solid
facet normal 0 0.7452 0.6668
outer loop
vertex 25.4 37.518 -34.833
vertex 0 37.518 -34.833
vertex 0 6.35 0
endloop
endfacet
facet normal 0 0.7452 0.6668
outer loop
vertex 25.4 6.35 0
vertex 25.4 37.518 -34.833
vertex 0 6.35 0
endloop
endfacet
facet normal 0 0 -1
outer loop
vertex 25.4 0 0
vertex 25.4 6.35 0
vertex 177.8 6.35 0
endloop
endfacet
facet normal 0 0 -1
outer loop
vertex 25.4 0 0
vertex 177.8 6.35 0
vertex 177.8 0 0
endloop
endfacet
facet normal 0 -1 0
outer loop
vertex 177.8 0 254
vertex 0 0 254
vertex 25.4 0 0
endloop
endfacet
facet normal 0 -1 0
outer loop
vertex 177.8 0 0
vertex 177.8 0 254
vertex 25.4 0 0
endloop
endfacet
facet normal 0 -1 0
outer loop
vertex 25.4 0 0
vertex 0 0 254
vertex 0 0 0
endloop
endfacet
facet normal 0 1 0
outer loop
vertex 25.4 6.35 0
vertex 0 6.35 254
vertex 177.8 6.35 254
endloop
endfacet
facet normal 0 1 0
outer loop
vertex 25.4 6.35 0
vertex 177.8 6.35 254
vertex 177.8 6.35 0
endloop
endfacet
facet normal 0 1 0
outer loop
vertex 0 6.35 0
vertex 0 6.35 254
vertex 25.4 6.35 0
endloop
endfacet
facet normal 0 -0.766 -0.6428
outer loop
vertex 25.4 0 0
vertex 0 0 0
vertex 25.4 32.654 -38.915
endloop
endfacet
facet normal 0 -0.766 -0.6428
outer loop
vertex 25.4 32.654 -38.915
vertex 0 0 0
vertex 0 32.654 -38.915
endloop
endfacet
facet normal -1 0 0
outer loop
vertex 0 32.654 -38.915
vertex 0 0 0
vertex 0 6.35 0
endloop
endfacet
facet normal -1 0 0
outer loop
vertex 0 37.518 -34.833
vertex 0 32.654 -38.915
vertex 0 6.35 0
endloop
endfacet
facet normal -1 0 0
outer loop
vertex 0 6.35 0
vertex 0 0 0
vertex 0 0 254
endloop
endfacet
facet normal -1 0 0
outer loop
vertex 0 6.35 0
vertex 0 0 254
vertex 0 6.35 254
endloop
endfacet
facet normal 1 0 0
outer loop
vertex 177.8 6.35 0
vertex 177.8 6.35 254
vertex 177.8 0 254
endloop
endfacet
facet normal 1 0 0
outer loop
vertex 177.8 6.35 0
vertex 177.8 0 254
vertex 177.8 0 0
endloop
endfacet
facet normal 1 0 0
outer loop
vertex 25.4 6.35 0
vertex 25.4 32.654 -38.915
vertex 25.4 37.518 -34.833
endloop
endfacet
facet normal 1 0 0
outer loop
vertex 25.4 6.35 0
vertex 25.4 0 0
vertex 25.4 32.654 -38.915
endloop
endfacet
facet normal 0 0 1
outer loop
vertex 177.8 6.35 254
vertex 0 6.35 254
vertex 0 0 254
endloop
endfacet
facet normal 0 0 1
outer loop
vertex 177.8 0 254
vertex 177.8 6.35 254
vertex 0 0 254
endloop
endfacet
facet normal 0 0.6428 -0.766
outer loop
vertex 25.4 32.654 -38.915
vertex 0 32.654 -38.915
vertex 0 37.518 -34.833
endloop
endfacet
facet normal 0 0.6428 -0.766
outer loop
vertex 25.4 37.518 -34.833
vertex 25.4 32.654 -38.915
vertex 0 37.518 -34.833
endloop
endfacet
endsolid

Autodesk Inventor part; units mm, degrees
ref_plane "YZ Plane" through (0, 0, 0) normal (1, 0, 0) x (0, 1, 0)
ref_plane "XZ Plane" through (0, 0, 0) normal (0, 1, 0) x (-1, 0, 0)
ref_plane "XY Plane" through (0, 0, 0) normal (0, 0, 1) x (1, 0, 0)
sketch "Sketch1" plane through (0, 0, 0) normal (1, 0, 0) x (0, 1, 0)
  line L0 (0, 0) -> (6.35, 0)
  line L1 (6.35, 0) -> (6.35, 254)
  line L2 (6.35, 254) -> (0, 254)
  line L3 (0, 254) -> (0, 0)
  line L4 (0, 0) -> (32.6536, -38.9151)
  line L5 (0, 0) -> (50.8, 0) construction
  line L6 (32.6536, -38.9151) -> (37.518, -34.8334)
  line L7 (37.518, -34.8334) -> (6.35, 0)
  dimension "d0" = 6.35
  dimension "d1" = 254
  dimension "d2" = 50.8
  dimension "d3" = 50
  dimension "d4" = 6.35
extrude "Extrusion1" add sketch "Sketch1" along normal blind 25.4
sketch "Sketch2" plane through (25.4, 0, 0) normal (1, 0, 0) x (0, 0, -1)
  line L0 (-254, 6.35) -> (-254, 0) projected
  line L1 (-254, 0) -> (0, 0) projected
  line L2 (-254, 6.35) -> (0, 6.35)
  line L3 (0, 6.35) -> (0, 0)
  line L4 (0, 0) -> (-254, 0)
  line L5 (-254, 0) -> (-254, 6.35)
extrude "Extrusion2" add sketch "Sketch2" along normal blind 152.4
properties part number "Ball Blocker"
